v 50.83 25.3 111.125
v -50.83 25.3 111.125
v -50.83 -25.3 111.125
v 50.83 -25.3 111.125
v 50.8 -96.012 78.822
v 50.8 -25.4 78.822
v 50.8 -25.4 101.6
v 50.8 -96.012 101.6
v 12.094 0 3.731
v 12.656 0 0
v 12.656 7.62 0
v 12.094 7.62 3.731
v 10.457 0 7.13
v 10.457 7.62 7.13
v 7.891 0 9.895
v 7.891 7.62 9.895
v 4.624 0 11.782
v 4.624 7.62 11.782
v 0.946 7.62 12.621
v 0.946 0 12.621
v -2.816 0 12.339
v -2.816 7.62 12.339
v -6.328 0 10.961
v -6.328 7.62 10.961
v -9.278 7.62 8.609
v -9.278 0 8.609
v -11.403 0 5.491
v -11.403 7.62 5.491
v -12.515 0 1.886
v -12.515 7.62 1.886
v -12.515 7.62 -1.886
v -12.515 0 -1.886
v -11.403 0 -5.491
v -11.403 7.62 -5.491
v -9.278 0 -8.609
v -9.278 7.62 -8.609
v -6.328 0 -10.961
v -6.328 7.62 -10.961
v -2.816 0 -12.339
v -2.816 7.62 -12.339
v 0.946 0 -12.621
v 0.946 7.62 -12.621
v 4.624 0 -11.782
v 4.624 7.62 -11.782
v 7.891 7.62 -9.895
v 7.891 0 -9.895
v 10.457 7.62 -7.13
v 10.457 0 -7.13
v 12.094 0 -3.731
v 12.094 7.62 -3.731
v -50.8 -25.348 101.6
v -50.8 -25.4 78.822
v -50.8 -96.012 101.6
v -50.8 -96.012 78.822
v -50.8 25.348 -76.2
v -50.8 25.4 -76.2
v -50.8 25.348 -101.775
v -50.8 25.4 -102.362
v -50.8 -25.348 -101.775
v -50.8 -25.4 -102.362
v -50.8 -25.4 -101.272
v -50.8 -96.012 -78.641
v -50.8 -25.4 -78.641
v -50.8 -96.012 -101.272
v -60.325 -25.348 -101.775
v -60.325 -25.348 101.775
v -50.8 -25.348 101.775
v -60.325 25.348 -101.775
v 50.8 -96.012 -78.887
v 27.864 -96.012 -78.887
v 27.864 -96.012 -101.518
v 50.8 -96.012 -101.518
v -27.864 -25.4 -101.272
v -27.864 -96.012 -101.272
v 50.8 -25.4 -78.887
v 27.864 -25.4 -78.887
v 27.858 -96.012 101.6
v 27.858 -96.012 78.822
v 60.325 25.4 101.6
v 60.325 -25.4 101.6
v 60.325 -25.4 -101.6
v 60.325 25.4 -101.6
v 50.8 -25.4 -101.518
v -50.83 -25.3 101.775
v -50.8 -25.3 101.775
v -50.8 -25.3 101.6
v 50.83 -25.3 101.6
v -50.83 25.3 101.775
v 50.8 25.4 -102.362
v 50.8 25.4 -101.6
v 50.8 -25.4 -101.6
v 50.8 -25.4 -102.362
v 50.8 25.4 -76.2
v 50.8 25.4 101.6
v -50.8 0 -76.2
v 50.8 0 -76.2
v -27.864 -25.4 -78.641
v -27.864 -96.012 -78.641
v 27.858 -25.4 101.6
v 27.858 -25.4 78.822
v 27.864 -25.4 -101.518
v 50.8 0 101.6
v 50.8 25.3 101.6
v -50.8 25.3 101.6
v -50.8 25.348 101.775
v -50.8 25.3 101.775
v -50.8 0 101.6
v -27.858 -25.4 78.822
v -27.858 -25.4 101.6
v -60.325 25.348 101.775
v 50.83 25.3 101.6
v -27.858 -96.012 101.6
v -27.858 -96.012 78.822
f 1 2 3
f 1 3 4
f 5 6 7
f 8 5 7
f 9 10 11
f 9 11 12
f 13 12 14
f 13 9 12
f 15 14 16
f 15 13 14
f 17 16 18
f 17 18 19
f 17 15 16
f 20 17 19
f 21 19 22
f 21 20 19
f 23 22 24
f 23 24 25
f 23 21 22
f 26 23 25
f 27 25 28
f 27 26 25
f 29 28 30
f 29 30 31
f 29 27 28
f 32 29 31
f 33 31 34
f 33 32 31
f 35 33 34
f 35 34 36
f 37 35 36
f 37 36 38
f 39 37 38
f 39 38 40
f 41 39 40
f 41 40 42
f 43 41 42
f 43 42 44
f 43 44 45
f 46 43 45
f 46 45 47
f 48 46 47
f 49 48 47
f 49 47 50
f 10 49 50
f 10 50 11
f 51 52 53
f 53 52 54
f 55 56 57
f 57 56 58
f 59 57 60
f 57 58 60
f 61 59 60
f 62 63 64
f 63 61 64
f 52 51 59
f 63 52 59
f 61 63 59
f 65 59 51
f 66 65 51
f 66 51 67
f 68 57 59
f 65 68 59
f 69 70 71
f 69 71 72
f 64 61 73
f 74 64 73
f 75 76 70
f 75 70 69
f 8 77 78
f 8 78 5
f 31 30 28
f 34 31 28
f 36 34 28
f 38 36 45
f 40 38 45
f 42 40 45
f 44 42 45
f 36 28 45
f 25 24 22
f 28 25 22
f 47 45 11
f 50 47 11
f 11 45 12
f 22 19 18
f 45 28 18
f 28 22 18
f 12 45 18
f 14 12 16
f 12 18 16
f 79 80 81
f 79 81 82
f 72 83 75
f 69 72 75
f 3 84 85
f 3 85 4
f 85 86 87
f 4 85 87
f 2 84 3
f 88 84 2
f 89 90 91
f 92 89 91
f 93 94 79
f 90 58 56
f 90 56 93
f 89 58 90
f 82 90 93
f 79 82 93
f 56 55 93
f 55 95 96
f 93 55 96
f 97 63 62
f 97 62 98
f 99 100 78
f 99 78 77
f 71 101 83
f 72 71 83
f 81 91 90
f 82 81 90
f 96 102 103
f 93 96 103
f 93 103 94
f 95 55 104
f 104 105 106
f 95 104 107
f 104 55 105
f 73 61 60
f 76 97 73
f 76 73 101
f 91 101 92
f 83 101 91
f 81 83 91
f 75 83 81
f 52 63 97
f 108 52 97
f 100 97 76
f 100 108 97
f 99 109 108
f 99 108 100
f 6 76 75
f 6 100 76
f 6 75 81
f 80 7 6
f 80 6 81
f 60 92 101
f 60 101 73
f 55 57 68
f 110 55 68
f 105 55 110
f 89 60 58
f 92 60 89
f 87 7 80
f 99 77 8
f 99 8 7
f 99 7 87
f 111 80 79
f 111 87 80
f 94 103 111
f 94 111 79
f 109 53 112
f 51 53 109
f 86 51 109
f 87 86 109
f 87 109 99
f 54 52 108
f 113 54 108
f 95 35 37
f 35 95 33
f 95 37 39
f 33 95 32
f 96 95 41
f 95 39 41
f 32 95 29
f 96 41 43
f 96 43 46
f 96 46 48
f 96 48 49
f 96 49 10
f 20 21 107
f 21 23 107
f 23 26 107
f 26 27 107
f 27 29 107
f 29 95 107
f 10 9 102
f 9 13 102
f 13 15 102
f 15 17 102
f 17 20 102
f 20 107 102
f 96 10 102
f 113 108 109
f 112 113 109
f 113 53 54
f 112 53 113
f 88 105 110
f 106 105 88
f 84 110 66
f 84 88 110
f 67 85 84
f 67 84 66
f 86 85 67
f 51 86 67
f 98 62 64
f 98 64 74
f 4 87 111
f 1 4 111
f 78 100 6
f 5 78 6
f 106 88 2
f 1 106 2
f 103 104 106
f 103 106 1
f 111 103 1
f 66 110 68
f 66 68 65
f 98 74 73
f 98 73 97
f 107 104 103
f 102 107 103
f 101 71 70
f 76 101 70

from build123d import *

# Parameters (mm, degrees)
F0_W           = 101.6
F0_H           = 203.2
F1_DEPTH       = 25.4
F2_W           = 22.9419407606
F2_H           = 22.7780664682
F2_W_2         = 22.94193331
F2_W_3         = 22.9362
F2_H_2         = 22.6314
F3_DEPTH       = 70.612
F4_W           = 50.8
F4_H           = 203.2
F5_DEPTH       = 9.525
F6_W           = 101.6606390476
F6_H           = 50.6004877388
F7_DEPTH       = 9.525
F8_W           = 50.696041435
F8_H           = 203.55078578
F9_DEPTH       = 9.525
F10_W          = 101.6
F10_H          = 50.8
F11_DEPTH      = 0.762
F11_DEPTH_BACK = 25.4
F12_DEPTH      = 25.4
F13_R          = 12.6564144883
F14_DEPTH      = 33.02


with BuildPart() as f1:
    # F0 (on Front) → F1 (new body)
    with BuildSketch(Plane.XZ):
        Rectangle(F0_W, F0_H)
    extrude(amount=F1_DEPTH)

    # F2 (on face) → F3 (join)
    with BuildSketch(Plane.XZ.offset(25.4)):
        with Locations((39.3290296197, 90.2109667659)):
            Rectangle(F2_W, F2_H)
        with Locations((-39.329033345, 90.2109667659)):
            Rectangle(F2_W_2, F2_H)
        with Locations((-39.3319, -89.9565626328)):
            Rectangle(F2_W_3, F2_H_2)
        with Locations((39.3319, -90.2023647373)):
            Rectangle(F2_W_3, F2_H_2)
    extrude(amount=F3_DEPTH)

    # F4 (on face) → F5 (join)
    with BuildSketch(Plane.YZ.offset(50.8)):
        Rectangle(F4_W, F4_H)
    extrude(amount=F5_DEPTH)

    # F6 (on face) → F7 (join)
    with BuildSketch(Plane.XY.offset(101.6)):
        Rectangle(F6_W, F6_H)
    extrude(amount=F7_DEPTH)

    # F8 (on face) → F9 (join)
    with BuildSketch(Plane(origin=(-50.8, 0, 0), x_dir=(0, -1, 0), z_dir=(-1, 0, 0))):
        Rectangle(F8_W, F8_H)
    extrude(amount=F9_DEPTH)

    # F10 (on face) → F11 (join, two sides)
    with BuildSketch(Plane(origin=(0, 0, -101.6), x_dir=(1, 0, 0), z_dir=(0, 0, -1))) as f11_sk:
        Rectangle(F10_W, F10_H)
    extrude(amount=F11_DEPTH)
    extrude(f11_sk.sketch, amount=-F11_DEPTH_BACK)

    # F2 (on face) → F12 (join)
    with BuildSketch(Plane.XZ.offset(25.4)):
        with Locations((39.3290296197, 90.2109667659)):
            Rectangle(F2_W, F2_H)
        with Locations((-39.329033345, 90.2109667659)):
            Rectangle(F2_W_2, F2_H)
        with Locations((-39.3319, -89.9565626328)):
            Rectangle(F2_W_3, F2_H_2)
        with Locations((39.3319, -90.2023647373)):
            Rectangle(F2_W_3, F2_H_2)
    extrude(amount=F12_DEPTH)

    # F13 (on face) → F14 (join)
    with BuildSketch(Plane.XZ.offset(25.4)):
        Circle(F13_R)
    extrude(amount=-F14_DEPTH)


solid = f1.part
